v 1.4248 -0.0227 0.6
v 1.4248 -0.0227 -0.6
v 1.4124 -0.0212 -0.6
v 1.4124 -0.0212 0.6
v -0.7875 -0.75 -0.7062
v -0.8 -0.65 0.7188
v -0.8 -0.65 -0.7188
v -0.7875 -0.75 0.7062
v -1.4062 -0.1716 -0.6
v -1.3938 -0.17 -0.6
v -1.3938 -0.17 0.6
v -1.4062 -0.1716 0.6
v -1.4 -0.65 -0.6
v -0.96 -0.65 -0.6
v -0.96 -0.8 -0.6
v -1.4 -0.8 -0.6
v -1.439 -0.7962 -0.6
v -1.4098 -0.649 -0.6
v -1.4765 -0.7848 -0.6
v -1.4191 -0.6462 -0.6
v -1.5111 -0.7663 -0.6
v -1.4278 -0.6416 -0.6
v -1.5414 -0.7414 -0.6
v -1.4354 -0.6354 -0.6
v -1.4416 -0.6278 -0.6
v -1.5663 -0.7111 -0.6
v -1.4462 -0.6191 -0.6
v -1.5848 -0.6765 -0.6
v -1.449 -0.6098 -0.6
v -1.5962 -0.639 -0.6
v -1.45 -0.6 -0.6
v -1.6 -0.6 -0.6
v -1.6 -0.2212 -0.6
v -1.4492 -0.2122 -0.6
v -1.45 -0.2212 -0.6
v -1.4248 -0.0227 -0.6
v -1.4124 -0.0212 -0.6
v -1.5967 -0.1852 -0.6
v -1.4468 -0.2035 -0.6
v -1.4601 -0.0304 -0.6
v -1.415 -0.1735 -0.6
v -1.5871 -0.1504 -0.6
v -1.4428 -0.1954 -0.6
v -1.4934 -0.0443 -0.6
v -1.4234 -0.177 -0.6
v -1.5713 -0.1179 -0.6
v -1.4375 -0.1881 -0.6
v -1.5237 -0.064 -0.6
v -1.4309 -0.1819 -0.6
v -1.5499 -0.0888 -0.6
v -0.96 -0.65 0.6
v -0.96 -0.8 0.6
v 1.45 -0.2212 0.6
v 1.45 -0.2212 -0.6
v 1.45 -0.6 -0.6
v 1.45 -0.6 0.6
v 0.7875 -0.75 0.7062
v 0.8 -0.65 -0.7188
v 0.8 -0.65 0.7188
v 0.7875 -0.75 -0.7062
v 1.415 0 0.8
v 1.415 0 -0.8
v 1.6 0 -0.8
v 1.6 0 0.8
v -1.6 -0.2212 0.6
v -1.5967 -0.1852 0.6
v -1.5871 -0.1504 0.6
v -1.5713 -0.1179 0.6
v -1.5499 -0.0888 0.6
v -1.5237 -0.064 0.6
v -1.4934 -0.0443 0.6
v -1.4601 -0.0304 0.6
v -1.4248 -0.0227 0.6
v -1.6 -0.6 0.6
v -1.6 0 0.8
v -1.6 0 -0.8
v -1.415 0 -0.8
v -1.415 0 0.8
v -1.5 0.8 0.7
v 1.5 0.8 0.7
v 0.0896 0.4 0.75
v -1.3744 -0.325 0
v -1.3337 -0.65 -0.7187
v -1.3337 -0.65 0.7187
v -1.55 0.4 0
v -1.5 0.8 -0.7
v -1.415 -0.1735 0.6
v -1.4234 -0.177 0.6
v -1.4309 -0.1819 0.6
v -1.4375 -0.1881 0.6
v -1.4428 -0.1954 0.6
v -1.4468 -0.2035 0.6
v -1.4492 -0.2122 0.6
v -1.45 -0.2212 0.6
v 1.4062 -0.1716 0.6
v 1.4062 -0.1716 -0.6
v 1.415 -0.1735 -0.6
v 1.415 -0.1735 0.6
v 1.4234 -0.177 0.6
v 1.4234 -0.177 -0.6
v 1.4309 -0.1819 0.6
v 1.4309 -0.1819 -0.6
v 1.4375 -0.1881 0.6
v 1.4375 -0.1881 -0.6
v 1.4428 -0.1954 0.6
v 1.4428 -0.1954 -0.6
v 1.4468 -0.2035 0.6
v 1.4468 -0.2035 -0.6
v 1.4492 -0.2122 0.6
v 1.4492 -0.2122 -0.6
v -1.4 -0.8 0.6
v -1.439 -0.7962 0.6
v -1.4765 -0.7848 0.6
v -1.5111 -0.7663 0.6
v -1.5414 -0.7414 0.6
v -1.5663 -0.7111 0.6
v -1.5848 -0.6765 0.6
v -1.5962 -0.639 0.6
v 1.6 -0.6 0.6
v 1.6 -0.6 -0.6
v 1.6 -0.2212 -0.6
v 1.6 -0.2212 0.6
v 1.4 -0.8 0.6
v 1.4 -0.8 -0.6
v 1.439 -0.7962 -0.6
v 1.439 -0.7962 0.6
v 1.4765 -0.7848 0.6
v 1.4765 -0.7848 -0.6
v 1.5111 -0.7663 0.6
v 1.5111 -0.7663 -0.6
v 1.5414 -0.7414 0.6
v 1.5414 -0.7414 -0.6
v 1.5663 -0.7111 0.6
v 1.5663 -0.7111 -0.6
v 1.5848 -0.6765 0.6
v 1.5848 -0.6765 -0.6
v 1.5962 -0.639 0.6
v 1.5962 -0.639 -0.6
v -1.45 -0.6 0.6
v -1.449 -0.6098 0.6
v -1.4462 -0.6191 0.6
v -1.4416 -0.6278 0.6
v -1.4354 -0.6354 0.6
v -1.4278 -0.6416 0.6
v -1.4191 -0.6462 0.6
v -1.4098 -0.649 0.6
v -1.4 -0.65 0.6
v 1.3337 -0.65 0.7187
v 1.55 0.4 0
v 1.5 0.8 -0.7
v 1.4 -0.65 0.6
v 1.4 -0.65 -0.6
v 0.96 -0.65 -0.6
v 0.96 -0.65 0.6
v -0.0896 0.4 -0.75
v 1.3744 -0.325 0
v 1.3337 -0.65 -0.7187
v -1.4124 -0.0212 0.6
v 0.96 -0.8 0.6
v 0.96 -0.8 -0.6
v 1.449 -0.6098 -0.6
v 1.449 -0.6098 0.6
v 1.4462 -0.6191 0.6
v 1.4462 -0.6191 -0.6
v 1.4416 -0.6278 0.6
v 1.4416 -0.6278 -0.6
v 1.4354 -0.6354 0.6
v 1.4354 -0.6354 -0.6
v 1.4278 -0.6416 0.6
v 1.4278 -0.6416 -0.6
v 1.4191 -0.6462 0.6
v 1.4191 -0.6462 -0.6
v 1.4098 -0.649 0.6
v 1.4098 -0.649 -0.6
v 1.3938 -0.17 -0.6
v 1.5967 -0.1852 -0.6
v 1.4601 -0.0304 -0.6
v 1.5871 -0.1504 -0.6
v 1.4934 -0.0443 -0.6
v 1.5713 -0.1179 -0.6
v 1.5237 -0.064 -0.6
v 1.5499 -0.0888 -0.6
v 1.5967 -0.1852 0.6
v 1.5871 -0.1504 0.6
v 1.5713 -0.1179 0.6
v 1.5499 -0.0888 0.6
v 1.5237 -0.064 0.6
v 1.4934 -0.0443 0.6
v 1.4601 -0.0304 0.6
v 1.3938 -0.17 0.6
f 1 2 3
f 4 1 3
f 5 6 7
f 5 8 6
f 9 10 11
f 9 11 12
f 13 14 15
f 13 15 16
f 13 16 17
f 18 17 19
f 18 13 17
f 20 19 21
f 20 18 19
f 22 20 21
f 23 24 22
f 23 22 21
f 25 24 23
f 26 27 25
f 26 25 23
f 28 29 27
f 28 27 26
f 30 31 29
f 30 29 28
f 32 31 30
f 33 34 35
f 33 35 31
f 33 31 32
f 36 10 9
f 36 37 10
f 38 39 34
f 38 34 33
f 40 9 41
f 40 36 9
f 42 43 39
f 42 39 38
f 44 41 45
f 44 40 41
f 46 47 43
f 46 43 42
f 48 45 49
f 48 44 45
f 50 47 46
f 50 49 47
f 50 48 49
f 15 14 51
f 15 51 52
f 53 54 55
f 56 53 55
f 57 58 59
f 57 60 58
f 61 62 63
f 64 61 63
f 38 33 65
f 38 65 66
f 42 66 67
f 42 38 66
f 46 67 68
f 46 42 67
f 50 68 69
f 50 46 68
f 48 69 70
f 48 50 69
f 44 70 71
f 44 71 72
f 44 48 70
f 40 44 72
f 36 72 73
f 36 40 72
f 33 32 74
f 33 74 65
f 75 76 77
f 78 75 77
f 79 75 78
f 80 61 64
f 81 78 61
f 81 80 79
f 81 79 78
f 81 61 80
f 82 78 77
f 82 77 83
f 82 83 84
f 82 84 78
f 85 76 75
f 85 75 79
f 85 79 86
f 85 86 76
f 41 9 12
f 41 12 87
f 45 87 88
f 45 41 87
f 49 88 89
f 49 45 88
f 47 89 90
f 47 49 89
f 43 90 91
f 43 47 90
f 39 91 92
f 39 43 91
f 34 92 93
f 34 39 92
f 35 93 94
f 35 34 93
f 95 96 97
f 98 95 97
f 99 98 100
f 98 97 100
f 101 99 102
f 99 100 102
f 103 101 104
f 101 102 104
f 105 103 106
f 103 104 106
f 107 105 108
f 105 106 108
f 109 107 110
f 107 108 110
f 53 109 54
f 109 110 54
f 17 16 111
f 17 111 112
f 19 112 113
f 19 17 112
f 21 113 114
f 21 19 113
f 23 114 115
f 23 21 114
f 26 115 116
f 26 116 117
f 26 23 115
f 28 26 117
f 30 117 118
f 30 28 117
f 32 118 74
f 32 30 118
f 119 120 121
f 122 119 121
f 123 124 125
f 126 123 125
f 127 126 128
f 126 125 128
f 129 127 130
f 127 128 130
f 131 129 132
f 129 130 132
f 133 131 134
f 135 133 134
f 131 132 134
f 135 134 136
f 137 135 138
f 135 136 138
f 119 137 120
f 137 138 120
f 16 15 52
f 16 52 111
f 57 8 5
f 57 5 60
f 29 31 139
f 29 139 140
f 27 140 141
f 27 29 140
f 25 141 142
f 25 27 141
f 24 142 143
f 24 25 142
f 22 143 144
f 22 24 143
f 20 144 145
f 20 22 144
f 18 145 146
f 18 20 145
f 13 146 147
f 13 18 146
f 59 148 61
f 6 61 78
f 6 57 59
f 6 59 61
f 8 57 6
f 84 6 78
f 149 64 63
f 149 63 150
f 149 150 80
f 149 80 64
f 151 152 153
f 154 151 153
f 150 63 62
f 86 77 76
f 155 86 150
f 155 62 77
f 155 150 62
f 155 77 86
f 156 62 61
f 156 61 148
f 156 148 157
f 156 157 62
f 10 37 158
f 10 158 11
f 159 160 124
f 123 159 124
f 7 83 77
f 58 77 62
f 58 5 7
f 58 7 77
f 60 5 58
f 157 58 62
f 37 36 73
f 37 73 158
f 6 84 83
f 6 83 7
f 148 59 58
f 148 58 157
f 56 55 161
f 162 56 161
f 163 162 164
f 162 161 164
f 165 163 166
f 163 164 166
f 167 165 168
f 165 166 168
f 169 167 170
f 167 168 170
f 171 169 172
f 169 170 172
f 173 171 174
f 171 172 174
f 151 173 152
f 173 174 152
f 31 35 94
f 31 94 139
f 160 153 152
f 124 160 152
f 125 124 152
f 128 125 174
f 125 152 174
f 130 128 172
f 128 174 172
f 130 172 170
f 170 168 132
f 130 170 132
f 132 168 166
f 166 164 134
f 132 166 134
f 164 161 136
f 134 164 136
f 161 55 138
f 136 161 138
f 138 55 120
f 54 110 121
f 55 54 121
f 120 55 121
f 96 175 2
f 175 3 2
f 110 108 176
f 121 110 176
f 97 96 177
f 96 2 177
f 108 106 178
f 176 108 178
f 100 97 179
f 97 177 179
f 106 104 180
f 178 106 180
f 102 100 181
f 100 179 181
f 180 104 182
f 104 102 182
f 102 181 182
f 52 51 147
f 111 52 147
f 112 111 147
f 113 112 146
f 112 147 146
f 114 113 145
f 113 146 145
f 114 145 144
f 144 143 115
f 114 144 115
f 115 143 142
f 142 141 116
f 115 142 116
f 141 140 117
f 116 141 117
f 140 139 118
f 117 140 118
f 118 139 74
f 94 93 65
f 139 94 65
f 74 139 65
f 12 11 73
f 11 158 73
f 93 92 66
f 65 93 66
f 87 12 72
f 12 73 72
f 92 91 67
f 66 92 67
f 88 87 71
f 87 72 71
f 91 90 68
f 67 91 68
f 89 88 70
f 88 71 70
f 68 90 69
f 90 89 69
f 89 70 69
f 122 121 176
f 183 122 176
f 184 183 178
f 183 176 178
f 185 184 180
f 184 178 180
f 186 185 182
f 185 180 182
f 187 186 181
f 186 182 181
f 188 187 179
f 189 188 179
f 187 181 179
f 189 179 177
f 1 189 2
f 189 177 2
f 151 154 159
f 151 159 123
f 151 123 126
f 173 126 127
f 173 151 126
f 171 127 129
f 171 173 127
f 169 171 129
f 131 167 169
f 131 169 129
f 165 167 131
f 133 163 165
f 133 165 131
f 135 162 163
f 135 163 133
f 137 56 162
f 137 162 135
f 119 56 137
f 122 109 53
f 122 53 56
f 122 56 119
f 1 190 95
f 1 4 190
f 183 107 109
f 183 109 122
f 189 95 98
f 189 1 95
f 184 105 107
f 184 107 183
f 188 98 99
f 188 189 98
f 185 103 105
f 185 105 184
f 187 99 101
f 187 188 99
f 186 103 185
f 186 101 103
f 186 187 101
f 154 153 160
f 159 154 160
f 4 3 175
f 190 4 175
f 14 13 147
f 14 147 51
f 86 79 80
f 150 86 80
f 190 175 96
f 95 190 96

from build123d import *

# Parameters (mm, degrees)
ESQUISSE1_W                    = 3.2
ESQUISSE1_H                    = 1.6
BOSS_EXTRU_1_DEPTH             = 0.8
BOSS_EXTRU_1_TAPER             = 7.125016349
ESQUISSE3_W                    = 2.83
ESQUISSE3_H                    = 1.6
BOSS_EXTRU_2_DEPTH             = 0.65
BOSS_EXTRU_2_TAPER             = 7.125016349
T_LE_DE_BASE_PLI_E1_DEPTH      = 0.6
T_LE_DE_BASE_PLI_E1_DEPTH_BACK = 0.6
ESQUISSE11_W                   = 1.6
ESQUISSE11_H                   = 1.4375
BOSS_EXTRU_3_DEPTH             = 0.1
BOSS_EXTRU_3_TAPER             = 7.125016349


# Sheet-metal steps are written as plain solids
with BuildPart() as part:
    # Esquisse1 → Boss.-Extru.1 (new body)
    with BuildSketch(Plane(origin=(0, 0, 0), x_dir=(1, 0, 0), z_dir=(0, 1, 0))):
        Rectangle(ESQUISSE1_W, ESQUISSE1_H)
    extrude(amount=BOSS_EXTRU_1_DEPTH, taper=BOSS_EXTRU_1_TAPER)

    # Esquisse3 → Boss.-Extru.2 (add)
    with BuildSketch(Plane.XZ):
        Rectangle(ESQUISSE3_W, ESQUISSE3_H)
    extrude(amount=BOSS_EXTRU_2_DEPTH, taper=BOSS_EXTRU_2_TAPER)

    # Esquisse11 → Boss.-Extru.3 (add)
    with BuildSketch(Plane.XZ.offset(0.65)):
        Rectangle(ESQUISSE11_W, ESQUISSE11_H)
    extrude(amount=BOSS_EXTRU_3_DEPTH, taper=BOSS_EXTRU_3_TAPER)


with BuildPart() as body_2:
    # Esquisse4 → Tôle de base pliée1 (new, two sides: drawn at the far end of the back side and taken through both)
    with BuildSketch(Plane.XY.offset(-T_LE_DE_BASE_PLI_E1_DEPTH_BACK)):
        with BuildLine():
            Line((-1.39375, -0.17), (-1.406201737, -0.171556467))
            ThreePointArc((-1.406201737, -0.171556467), (-1.437483909, -0.188080233), (-1.45, -0.221170361))
            Line((-1.45, -0.221170361), (-1.45, -0.6))
            ThreePointArc((-1.45, -0.6), (-1.435355339, -0.635355339), (-1.4, -0.65))
            Line((-1.4, -0.65), (-0.96, -0.65))
            Line((-0.96, -0.65), (-0.96, -0.8))
            Line((-0.96, -0.8), (-1.4, -0.8))
            ThreePointArc((-1.4, -0.8), (-1.541421356, -0.741421356), (-1.6, -0.6))
            Line((-1.6, -0.6), (-1.6, -0.221170361))
            ThreePointArc((-1.6, -0.221170361), (-1.549935635, -0.088809848), (-1.424806947, -0.022714786))
            Line((-1.424806947, -0.022714786), (-1.41235521, -0.021158318))
            Line((-1.41235521, -0.021158318), (-1.39375, -0.17))
        make_face()
    extrude(amount=T_LE_DE_BASE_PLI_E1_DEPTH + T_LE_DE_BASE_PLI_E1_DEPTH_BACK)


with BuildPart() as body_3:
    # Symétrie1: mirrored copy
    add(body_2.part.mirror(Plane(origin=(0, 0, 0), x_dir=(0, 0, 1), z_dir=(1, 0, 0))))


solid = Compound([part.part, body_2.part, body_3.part])
